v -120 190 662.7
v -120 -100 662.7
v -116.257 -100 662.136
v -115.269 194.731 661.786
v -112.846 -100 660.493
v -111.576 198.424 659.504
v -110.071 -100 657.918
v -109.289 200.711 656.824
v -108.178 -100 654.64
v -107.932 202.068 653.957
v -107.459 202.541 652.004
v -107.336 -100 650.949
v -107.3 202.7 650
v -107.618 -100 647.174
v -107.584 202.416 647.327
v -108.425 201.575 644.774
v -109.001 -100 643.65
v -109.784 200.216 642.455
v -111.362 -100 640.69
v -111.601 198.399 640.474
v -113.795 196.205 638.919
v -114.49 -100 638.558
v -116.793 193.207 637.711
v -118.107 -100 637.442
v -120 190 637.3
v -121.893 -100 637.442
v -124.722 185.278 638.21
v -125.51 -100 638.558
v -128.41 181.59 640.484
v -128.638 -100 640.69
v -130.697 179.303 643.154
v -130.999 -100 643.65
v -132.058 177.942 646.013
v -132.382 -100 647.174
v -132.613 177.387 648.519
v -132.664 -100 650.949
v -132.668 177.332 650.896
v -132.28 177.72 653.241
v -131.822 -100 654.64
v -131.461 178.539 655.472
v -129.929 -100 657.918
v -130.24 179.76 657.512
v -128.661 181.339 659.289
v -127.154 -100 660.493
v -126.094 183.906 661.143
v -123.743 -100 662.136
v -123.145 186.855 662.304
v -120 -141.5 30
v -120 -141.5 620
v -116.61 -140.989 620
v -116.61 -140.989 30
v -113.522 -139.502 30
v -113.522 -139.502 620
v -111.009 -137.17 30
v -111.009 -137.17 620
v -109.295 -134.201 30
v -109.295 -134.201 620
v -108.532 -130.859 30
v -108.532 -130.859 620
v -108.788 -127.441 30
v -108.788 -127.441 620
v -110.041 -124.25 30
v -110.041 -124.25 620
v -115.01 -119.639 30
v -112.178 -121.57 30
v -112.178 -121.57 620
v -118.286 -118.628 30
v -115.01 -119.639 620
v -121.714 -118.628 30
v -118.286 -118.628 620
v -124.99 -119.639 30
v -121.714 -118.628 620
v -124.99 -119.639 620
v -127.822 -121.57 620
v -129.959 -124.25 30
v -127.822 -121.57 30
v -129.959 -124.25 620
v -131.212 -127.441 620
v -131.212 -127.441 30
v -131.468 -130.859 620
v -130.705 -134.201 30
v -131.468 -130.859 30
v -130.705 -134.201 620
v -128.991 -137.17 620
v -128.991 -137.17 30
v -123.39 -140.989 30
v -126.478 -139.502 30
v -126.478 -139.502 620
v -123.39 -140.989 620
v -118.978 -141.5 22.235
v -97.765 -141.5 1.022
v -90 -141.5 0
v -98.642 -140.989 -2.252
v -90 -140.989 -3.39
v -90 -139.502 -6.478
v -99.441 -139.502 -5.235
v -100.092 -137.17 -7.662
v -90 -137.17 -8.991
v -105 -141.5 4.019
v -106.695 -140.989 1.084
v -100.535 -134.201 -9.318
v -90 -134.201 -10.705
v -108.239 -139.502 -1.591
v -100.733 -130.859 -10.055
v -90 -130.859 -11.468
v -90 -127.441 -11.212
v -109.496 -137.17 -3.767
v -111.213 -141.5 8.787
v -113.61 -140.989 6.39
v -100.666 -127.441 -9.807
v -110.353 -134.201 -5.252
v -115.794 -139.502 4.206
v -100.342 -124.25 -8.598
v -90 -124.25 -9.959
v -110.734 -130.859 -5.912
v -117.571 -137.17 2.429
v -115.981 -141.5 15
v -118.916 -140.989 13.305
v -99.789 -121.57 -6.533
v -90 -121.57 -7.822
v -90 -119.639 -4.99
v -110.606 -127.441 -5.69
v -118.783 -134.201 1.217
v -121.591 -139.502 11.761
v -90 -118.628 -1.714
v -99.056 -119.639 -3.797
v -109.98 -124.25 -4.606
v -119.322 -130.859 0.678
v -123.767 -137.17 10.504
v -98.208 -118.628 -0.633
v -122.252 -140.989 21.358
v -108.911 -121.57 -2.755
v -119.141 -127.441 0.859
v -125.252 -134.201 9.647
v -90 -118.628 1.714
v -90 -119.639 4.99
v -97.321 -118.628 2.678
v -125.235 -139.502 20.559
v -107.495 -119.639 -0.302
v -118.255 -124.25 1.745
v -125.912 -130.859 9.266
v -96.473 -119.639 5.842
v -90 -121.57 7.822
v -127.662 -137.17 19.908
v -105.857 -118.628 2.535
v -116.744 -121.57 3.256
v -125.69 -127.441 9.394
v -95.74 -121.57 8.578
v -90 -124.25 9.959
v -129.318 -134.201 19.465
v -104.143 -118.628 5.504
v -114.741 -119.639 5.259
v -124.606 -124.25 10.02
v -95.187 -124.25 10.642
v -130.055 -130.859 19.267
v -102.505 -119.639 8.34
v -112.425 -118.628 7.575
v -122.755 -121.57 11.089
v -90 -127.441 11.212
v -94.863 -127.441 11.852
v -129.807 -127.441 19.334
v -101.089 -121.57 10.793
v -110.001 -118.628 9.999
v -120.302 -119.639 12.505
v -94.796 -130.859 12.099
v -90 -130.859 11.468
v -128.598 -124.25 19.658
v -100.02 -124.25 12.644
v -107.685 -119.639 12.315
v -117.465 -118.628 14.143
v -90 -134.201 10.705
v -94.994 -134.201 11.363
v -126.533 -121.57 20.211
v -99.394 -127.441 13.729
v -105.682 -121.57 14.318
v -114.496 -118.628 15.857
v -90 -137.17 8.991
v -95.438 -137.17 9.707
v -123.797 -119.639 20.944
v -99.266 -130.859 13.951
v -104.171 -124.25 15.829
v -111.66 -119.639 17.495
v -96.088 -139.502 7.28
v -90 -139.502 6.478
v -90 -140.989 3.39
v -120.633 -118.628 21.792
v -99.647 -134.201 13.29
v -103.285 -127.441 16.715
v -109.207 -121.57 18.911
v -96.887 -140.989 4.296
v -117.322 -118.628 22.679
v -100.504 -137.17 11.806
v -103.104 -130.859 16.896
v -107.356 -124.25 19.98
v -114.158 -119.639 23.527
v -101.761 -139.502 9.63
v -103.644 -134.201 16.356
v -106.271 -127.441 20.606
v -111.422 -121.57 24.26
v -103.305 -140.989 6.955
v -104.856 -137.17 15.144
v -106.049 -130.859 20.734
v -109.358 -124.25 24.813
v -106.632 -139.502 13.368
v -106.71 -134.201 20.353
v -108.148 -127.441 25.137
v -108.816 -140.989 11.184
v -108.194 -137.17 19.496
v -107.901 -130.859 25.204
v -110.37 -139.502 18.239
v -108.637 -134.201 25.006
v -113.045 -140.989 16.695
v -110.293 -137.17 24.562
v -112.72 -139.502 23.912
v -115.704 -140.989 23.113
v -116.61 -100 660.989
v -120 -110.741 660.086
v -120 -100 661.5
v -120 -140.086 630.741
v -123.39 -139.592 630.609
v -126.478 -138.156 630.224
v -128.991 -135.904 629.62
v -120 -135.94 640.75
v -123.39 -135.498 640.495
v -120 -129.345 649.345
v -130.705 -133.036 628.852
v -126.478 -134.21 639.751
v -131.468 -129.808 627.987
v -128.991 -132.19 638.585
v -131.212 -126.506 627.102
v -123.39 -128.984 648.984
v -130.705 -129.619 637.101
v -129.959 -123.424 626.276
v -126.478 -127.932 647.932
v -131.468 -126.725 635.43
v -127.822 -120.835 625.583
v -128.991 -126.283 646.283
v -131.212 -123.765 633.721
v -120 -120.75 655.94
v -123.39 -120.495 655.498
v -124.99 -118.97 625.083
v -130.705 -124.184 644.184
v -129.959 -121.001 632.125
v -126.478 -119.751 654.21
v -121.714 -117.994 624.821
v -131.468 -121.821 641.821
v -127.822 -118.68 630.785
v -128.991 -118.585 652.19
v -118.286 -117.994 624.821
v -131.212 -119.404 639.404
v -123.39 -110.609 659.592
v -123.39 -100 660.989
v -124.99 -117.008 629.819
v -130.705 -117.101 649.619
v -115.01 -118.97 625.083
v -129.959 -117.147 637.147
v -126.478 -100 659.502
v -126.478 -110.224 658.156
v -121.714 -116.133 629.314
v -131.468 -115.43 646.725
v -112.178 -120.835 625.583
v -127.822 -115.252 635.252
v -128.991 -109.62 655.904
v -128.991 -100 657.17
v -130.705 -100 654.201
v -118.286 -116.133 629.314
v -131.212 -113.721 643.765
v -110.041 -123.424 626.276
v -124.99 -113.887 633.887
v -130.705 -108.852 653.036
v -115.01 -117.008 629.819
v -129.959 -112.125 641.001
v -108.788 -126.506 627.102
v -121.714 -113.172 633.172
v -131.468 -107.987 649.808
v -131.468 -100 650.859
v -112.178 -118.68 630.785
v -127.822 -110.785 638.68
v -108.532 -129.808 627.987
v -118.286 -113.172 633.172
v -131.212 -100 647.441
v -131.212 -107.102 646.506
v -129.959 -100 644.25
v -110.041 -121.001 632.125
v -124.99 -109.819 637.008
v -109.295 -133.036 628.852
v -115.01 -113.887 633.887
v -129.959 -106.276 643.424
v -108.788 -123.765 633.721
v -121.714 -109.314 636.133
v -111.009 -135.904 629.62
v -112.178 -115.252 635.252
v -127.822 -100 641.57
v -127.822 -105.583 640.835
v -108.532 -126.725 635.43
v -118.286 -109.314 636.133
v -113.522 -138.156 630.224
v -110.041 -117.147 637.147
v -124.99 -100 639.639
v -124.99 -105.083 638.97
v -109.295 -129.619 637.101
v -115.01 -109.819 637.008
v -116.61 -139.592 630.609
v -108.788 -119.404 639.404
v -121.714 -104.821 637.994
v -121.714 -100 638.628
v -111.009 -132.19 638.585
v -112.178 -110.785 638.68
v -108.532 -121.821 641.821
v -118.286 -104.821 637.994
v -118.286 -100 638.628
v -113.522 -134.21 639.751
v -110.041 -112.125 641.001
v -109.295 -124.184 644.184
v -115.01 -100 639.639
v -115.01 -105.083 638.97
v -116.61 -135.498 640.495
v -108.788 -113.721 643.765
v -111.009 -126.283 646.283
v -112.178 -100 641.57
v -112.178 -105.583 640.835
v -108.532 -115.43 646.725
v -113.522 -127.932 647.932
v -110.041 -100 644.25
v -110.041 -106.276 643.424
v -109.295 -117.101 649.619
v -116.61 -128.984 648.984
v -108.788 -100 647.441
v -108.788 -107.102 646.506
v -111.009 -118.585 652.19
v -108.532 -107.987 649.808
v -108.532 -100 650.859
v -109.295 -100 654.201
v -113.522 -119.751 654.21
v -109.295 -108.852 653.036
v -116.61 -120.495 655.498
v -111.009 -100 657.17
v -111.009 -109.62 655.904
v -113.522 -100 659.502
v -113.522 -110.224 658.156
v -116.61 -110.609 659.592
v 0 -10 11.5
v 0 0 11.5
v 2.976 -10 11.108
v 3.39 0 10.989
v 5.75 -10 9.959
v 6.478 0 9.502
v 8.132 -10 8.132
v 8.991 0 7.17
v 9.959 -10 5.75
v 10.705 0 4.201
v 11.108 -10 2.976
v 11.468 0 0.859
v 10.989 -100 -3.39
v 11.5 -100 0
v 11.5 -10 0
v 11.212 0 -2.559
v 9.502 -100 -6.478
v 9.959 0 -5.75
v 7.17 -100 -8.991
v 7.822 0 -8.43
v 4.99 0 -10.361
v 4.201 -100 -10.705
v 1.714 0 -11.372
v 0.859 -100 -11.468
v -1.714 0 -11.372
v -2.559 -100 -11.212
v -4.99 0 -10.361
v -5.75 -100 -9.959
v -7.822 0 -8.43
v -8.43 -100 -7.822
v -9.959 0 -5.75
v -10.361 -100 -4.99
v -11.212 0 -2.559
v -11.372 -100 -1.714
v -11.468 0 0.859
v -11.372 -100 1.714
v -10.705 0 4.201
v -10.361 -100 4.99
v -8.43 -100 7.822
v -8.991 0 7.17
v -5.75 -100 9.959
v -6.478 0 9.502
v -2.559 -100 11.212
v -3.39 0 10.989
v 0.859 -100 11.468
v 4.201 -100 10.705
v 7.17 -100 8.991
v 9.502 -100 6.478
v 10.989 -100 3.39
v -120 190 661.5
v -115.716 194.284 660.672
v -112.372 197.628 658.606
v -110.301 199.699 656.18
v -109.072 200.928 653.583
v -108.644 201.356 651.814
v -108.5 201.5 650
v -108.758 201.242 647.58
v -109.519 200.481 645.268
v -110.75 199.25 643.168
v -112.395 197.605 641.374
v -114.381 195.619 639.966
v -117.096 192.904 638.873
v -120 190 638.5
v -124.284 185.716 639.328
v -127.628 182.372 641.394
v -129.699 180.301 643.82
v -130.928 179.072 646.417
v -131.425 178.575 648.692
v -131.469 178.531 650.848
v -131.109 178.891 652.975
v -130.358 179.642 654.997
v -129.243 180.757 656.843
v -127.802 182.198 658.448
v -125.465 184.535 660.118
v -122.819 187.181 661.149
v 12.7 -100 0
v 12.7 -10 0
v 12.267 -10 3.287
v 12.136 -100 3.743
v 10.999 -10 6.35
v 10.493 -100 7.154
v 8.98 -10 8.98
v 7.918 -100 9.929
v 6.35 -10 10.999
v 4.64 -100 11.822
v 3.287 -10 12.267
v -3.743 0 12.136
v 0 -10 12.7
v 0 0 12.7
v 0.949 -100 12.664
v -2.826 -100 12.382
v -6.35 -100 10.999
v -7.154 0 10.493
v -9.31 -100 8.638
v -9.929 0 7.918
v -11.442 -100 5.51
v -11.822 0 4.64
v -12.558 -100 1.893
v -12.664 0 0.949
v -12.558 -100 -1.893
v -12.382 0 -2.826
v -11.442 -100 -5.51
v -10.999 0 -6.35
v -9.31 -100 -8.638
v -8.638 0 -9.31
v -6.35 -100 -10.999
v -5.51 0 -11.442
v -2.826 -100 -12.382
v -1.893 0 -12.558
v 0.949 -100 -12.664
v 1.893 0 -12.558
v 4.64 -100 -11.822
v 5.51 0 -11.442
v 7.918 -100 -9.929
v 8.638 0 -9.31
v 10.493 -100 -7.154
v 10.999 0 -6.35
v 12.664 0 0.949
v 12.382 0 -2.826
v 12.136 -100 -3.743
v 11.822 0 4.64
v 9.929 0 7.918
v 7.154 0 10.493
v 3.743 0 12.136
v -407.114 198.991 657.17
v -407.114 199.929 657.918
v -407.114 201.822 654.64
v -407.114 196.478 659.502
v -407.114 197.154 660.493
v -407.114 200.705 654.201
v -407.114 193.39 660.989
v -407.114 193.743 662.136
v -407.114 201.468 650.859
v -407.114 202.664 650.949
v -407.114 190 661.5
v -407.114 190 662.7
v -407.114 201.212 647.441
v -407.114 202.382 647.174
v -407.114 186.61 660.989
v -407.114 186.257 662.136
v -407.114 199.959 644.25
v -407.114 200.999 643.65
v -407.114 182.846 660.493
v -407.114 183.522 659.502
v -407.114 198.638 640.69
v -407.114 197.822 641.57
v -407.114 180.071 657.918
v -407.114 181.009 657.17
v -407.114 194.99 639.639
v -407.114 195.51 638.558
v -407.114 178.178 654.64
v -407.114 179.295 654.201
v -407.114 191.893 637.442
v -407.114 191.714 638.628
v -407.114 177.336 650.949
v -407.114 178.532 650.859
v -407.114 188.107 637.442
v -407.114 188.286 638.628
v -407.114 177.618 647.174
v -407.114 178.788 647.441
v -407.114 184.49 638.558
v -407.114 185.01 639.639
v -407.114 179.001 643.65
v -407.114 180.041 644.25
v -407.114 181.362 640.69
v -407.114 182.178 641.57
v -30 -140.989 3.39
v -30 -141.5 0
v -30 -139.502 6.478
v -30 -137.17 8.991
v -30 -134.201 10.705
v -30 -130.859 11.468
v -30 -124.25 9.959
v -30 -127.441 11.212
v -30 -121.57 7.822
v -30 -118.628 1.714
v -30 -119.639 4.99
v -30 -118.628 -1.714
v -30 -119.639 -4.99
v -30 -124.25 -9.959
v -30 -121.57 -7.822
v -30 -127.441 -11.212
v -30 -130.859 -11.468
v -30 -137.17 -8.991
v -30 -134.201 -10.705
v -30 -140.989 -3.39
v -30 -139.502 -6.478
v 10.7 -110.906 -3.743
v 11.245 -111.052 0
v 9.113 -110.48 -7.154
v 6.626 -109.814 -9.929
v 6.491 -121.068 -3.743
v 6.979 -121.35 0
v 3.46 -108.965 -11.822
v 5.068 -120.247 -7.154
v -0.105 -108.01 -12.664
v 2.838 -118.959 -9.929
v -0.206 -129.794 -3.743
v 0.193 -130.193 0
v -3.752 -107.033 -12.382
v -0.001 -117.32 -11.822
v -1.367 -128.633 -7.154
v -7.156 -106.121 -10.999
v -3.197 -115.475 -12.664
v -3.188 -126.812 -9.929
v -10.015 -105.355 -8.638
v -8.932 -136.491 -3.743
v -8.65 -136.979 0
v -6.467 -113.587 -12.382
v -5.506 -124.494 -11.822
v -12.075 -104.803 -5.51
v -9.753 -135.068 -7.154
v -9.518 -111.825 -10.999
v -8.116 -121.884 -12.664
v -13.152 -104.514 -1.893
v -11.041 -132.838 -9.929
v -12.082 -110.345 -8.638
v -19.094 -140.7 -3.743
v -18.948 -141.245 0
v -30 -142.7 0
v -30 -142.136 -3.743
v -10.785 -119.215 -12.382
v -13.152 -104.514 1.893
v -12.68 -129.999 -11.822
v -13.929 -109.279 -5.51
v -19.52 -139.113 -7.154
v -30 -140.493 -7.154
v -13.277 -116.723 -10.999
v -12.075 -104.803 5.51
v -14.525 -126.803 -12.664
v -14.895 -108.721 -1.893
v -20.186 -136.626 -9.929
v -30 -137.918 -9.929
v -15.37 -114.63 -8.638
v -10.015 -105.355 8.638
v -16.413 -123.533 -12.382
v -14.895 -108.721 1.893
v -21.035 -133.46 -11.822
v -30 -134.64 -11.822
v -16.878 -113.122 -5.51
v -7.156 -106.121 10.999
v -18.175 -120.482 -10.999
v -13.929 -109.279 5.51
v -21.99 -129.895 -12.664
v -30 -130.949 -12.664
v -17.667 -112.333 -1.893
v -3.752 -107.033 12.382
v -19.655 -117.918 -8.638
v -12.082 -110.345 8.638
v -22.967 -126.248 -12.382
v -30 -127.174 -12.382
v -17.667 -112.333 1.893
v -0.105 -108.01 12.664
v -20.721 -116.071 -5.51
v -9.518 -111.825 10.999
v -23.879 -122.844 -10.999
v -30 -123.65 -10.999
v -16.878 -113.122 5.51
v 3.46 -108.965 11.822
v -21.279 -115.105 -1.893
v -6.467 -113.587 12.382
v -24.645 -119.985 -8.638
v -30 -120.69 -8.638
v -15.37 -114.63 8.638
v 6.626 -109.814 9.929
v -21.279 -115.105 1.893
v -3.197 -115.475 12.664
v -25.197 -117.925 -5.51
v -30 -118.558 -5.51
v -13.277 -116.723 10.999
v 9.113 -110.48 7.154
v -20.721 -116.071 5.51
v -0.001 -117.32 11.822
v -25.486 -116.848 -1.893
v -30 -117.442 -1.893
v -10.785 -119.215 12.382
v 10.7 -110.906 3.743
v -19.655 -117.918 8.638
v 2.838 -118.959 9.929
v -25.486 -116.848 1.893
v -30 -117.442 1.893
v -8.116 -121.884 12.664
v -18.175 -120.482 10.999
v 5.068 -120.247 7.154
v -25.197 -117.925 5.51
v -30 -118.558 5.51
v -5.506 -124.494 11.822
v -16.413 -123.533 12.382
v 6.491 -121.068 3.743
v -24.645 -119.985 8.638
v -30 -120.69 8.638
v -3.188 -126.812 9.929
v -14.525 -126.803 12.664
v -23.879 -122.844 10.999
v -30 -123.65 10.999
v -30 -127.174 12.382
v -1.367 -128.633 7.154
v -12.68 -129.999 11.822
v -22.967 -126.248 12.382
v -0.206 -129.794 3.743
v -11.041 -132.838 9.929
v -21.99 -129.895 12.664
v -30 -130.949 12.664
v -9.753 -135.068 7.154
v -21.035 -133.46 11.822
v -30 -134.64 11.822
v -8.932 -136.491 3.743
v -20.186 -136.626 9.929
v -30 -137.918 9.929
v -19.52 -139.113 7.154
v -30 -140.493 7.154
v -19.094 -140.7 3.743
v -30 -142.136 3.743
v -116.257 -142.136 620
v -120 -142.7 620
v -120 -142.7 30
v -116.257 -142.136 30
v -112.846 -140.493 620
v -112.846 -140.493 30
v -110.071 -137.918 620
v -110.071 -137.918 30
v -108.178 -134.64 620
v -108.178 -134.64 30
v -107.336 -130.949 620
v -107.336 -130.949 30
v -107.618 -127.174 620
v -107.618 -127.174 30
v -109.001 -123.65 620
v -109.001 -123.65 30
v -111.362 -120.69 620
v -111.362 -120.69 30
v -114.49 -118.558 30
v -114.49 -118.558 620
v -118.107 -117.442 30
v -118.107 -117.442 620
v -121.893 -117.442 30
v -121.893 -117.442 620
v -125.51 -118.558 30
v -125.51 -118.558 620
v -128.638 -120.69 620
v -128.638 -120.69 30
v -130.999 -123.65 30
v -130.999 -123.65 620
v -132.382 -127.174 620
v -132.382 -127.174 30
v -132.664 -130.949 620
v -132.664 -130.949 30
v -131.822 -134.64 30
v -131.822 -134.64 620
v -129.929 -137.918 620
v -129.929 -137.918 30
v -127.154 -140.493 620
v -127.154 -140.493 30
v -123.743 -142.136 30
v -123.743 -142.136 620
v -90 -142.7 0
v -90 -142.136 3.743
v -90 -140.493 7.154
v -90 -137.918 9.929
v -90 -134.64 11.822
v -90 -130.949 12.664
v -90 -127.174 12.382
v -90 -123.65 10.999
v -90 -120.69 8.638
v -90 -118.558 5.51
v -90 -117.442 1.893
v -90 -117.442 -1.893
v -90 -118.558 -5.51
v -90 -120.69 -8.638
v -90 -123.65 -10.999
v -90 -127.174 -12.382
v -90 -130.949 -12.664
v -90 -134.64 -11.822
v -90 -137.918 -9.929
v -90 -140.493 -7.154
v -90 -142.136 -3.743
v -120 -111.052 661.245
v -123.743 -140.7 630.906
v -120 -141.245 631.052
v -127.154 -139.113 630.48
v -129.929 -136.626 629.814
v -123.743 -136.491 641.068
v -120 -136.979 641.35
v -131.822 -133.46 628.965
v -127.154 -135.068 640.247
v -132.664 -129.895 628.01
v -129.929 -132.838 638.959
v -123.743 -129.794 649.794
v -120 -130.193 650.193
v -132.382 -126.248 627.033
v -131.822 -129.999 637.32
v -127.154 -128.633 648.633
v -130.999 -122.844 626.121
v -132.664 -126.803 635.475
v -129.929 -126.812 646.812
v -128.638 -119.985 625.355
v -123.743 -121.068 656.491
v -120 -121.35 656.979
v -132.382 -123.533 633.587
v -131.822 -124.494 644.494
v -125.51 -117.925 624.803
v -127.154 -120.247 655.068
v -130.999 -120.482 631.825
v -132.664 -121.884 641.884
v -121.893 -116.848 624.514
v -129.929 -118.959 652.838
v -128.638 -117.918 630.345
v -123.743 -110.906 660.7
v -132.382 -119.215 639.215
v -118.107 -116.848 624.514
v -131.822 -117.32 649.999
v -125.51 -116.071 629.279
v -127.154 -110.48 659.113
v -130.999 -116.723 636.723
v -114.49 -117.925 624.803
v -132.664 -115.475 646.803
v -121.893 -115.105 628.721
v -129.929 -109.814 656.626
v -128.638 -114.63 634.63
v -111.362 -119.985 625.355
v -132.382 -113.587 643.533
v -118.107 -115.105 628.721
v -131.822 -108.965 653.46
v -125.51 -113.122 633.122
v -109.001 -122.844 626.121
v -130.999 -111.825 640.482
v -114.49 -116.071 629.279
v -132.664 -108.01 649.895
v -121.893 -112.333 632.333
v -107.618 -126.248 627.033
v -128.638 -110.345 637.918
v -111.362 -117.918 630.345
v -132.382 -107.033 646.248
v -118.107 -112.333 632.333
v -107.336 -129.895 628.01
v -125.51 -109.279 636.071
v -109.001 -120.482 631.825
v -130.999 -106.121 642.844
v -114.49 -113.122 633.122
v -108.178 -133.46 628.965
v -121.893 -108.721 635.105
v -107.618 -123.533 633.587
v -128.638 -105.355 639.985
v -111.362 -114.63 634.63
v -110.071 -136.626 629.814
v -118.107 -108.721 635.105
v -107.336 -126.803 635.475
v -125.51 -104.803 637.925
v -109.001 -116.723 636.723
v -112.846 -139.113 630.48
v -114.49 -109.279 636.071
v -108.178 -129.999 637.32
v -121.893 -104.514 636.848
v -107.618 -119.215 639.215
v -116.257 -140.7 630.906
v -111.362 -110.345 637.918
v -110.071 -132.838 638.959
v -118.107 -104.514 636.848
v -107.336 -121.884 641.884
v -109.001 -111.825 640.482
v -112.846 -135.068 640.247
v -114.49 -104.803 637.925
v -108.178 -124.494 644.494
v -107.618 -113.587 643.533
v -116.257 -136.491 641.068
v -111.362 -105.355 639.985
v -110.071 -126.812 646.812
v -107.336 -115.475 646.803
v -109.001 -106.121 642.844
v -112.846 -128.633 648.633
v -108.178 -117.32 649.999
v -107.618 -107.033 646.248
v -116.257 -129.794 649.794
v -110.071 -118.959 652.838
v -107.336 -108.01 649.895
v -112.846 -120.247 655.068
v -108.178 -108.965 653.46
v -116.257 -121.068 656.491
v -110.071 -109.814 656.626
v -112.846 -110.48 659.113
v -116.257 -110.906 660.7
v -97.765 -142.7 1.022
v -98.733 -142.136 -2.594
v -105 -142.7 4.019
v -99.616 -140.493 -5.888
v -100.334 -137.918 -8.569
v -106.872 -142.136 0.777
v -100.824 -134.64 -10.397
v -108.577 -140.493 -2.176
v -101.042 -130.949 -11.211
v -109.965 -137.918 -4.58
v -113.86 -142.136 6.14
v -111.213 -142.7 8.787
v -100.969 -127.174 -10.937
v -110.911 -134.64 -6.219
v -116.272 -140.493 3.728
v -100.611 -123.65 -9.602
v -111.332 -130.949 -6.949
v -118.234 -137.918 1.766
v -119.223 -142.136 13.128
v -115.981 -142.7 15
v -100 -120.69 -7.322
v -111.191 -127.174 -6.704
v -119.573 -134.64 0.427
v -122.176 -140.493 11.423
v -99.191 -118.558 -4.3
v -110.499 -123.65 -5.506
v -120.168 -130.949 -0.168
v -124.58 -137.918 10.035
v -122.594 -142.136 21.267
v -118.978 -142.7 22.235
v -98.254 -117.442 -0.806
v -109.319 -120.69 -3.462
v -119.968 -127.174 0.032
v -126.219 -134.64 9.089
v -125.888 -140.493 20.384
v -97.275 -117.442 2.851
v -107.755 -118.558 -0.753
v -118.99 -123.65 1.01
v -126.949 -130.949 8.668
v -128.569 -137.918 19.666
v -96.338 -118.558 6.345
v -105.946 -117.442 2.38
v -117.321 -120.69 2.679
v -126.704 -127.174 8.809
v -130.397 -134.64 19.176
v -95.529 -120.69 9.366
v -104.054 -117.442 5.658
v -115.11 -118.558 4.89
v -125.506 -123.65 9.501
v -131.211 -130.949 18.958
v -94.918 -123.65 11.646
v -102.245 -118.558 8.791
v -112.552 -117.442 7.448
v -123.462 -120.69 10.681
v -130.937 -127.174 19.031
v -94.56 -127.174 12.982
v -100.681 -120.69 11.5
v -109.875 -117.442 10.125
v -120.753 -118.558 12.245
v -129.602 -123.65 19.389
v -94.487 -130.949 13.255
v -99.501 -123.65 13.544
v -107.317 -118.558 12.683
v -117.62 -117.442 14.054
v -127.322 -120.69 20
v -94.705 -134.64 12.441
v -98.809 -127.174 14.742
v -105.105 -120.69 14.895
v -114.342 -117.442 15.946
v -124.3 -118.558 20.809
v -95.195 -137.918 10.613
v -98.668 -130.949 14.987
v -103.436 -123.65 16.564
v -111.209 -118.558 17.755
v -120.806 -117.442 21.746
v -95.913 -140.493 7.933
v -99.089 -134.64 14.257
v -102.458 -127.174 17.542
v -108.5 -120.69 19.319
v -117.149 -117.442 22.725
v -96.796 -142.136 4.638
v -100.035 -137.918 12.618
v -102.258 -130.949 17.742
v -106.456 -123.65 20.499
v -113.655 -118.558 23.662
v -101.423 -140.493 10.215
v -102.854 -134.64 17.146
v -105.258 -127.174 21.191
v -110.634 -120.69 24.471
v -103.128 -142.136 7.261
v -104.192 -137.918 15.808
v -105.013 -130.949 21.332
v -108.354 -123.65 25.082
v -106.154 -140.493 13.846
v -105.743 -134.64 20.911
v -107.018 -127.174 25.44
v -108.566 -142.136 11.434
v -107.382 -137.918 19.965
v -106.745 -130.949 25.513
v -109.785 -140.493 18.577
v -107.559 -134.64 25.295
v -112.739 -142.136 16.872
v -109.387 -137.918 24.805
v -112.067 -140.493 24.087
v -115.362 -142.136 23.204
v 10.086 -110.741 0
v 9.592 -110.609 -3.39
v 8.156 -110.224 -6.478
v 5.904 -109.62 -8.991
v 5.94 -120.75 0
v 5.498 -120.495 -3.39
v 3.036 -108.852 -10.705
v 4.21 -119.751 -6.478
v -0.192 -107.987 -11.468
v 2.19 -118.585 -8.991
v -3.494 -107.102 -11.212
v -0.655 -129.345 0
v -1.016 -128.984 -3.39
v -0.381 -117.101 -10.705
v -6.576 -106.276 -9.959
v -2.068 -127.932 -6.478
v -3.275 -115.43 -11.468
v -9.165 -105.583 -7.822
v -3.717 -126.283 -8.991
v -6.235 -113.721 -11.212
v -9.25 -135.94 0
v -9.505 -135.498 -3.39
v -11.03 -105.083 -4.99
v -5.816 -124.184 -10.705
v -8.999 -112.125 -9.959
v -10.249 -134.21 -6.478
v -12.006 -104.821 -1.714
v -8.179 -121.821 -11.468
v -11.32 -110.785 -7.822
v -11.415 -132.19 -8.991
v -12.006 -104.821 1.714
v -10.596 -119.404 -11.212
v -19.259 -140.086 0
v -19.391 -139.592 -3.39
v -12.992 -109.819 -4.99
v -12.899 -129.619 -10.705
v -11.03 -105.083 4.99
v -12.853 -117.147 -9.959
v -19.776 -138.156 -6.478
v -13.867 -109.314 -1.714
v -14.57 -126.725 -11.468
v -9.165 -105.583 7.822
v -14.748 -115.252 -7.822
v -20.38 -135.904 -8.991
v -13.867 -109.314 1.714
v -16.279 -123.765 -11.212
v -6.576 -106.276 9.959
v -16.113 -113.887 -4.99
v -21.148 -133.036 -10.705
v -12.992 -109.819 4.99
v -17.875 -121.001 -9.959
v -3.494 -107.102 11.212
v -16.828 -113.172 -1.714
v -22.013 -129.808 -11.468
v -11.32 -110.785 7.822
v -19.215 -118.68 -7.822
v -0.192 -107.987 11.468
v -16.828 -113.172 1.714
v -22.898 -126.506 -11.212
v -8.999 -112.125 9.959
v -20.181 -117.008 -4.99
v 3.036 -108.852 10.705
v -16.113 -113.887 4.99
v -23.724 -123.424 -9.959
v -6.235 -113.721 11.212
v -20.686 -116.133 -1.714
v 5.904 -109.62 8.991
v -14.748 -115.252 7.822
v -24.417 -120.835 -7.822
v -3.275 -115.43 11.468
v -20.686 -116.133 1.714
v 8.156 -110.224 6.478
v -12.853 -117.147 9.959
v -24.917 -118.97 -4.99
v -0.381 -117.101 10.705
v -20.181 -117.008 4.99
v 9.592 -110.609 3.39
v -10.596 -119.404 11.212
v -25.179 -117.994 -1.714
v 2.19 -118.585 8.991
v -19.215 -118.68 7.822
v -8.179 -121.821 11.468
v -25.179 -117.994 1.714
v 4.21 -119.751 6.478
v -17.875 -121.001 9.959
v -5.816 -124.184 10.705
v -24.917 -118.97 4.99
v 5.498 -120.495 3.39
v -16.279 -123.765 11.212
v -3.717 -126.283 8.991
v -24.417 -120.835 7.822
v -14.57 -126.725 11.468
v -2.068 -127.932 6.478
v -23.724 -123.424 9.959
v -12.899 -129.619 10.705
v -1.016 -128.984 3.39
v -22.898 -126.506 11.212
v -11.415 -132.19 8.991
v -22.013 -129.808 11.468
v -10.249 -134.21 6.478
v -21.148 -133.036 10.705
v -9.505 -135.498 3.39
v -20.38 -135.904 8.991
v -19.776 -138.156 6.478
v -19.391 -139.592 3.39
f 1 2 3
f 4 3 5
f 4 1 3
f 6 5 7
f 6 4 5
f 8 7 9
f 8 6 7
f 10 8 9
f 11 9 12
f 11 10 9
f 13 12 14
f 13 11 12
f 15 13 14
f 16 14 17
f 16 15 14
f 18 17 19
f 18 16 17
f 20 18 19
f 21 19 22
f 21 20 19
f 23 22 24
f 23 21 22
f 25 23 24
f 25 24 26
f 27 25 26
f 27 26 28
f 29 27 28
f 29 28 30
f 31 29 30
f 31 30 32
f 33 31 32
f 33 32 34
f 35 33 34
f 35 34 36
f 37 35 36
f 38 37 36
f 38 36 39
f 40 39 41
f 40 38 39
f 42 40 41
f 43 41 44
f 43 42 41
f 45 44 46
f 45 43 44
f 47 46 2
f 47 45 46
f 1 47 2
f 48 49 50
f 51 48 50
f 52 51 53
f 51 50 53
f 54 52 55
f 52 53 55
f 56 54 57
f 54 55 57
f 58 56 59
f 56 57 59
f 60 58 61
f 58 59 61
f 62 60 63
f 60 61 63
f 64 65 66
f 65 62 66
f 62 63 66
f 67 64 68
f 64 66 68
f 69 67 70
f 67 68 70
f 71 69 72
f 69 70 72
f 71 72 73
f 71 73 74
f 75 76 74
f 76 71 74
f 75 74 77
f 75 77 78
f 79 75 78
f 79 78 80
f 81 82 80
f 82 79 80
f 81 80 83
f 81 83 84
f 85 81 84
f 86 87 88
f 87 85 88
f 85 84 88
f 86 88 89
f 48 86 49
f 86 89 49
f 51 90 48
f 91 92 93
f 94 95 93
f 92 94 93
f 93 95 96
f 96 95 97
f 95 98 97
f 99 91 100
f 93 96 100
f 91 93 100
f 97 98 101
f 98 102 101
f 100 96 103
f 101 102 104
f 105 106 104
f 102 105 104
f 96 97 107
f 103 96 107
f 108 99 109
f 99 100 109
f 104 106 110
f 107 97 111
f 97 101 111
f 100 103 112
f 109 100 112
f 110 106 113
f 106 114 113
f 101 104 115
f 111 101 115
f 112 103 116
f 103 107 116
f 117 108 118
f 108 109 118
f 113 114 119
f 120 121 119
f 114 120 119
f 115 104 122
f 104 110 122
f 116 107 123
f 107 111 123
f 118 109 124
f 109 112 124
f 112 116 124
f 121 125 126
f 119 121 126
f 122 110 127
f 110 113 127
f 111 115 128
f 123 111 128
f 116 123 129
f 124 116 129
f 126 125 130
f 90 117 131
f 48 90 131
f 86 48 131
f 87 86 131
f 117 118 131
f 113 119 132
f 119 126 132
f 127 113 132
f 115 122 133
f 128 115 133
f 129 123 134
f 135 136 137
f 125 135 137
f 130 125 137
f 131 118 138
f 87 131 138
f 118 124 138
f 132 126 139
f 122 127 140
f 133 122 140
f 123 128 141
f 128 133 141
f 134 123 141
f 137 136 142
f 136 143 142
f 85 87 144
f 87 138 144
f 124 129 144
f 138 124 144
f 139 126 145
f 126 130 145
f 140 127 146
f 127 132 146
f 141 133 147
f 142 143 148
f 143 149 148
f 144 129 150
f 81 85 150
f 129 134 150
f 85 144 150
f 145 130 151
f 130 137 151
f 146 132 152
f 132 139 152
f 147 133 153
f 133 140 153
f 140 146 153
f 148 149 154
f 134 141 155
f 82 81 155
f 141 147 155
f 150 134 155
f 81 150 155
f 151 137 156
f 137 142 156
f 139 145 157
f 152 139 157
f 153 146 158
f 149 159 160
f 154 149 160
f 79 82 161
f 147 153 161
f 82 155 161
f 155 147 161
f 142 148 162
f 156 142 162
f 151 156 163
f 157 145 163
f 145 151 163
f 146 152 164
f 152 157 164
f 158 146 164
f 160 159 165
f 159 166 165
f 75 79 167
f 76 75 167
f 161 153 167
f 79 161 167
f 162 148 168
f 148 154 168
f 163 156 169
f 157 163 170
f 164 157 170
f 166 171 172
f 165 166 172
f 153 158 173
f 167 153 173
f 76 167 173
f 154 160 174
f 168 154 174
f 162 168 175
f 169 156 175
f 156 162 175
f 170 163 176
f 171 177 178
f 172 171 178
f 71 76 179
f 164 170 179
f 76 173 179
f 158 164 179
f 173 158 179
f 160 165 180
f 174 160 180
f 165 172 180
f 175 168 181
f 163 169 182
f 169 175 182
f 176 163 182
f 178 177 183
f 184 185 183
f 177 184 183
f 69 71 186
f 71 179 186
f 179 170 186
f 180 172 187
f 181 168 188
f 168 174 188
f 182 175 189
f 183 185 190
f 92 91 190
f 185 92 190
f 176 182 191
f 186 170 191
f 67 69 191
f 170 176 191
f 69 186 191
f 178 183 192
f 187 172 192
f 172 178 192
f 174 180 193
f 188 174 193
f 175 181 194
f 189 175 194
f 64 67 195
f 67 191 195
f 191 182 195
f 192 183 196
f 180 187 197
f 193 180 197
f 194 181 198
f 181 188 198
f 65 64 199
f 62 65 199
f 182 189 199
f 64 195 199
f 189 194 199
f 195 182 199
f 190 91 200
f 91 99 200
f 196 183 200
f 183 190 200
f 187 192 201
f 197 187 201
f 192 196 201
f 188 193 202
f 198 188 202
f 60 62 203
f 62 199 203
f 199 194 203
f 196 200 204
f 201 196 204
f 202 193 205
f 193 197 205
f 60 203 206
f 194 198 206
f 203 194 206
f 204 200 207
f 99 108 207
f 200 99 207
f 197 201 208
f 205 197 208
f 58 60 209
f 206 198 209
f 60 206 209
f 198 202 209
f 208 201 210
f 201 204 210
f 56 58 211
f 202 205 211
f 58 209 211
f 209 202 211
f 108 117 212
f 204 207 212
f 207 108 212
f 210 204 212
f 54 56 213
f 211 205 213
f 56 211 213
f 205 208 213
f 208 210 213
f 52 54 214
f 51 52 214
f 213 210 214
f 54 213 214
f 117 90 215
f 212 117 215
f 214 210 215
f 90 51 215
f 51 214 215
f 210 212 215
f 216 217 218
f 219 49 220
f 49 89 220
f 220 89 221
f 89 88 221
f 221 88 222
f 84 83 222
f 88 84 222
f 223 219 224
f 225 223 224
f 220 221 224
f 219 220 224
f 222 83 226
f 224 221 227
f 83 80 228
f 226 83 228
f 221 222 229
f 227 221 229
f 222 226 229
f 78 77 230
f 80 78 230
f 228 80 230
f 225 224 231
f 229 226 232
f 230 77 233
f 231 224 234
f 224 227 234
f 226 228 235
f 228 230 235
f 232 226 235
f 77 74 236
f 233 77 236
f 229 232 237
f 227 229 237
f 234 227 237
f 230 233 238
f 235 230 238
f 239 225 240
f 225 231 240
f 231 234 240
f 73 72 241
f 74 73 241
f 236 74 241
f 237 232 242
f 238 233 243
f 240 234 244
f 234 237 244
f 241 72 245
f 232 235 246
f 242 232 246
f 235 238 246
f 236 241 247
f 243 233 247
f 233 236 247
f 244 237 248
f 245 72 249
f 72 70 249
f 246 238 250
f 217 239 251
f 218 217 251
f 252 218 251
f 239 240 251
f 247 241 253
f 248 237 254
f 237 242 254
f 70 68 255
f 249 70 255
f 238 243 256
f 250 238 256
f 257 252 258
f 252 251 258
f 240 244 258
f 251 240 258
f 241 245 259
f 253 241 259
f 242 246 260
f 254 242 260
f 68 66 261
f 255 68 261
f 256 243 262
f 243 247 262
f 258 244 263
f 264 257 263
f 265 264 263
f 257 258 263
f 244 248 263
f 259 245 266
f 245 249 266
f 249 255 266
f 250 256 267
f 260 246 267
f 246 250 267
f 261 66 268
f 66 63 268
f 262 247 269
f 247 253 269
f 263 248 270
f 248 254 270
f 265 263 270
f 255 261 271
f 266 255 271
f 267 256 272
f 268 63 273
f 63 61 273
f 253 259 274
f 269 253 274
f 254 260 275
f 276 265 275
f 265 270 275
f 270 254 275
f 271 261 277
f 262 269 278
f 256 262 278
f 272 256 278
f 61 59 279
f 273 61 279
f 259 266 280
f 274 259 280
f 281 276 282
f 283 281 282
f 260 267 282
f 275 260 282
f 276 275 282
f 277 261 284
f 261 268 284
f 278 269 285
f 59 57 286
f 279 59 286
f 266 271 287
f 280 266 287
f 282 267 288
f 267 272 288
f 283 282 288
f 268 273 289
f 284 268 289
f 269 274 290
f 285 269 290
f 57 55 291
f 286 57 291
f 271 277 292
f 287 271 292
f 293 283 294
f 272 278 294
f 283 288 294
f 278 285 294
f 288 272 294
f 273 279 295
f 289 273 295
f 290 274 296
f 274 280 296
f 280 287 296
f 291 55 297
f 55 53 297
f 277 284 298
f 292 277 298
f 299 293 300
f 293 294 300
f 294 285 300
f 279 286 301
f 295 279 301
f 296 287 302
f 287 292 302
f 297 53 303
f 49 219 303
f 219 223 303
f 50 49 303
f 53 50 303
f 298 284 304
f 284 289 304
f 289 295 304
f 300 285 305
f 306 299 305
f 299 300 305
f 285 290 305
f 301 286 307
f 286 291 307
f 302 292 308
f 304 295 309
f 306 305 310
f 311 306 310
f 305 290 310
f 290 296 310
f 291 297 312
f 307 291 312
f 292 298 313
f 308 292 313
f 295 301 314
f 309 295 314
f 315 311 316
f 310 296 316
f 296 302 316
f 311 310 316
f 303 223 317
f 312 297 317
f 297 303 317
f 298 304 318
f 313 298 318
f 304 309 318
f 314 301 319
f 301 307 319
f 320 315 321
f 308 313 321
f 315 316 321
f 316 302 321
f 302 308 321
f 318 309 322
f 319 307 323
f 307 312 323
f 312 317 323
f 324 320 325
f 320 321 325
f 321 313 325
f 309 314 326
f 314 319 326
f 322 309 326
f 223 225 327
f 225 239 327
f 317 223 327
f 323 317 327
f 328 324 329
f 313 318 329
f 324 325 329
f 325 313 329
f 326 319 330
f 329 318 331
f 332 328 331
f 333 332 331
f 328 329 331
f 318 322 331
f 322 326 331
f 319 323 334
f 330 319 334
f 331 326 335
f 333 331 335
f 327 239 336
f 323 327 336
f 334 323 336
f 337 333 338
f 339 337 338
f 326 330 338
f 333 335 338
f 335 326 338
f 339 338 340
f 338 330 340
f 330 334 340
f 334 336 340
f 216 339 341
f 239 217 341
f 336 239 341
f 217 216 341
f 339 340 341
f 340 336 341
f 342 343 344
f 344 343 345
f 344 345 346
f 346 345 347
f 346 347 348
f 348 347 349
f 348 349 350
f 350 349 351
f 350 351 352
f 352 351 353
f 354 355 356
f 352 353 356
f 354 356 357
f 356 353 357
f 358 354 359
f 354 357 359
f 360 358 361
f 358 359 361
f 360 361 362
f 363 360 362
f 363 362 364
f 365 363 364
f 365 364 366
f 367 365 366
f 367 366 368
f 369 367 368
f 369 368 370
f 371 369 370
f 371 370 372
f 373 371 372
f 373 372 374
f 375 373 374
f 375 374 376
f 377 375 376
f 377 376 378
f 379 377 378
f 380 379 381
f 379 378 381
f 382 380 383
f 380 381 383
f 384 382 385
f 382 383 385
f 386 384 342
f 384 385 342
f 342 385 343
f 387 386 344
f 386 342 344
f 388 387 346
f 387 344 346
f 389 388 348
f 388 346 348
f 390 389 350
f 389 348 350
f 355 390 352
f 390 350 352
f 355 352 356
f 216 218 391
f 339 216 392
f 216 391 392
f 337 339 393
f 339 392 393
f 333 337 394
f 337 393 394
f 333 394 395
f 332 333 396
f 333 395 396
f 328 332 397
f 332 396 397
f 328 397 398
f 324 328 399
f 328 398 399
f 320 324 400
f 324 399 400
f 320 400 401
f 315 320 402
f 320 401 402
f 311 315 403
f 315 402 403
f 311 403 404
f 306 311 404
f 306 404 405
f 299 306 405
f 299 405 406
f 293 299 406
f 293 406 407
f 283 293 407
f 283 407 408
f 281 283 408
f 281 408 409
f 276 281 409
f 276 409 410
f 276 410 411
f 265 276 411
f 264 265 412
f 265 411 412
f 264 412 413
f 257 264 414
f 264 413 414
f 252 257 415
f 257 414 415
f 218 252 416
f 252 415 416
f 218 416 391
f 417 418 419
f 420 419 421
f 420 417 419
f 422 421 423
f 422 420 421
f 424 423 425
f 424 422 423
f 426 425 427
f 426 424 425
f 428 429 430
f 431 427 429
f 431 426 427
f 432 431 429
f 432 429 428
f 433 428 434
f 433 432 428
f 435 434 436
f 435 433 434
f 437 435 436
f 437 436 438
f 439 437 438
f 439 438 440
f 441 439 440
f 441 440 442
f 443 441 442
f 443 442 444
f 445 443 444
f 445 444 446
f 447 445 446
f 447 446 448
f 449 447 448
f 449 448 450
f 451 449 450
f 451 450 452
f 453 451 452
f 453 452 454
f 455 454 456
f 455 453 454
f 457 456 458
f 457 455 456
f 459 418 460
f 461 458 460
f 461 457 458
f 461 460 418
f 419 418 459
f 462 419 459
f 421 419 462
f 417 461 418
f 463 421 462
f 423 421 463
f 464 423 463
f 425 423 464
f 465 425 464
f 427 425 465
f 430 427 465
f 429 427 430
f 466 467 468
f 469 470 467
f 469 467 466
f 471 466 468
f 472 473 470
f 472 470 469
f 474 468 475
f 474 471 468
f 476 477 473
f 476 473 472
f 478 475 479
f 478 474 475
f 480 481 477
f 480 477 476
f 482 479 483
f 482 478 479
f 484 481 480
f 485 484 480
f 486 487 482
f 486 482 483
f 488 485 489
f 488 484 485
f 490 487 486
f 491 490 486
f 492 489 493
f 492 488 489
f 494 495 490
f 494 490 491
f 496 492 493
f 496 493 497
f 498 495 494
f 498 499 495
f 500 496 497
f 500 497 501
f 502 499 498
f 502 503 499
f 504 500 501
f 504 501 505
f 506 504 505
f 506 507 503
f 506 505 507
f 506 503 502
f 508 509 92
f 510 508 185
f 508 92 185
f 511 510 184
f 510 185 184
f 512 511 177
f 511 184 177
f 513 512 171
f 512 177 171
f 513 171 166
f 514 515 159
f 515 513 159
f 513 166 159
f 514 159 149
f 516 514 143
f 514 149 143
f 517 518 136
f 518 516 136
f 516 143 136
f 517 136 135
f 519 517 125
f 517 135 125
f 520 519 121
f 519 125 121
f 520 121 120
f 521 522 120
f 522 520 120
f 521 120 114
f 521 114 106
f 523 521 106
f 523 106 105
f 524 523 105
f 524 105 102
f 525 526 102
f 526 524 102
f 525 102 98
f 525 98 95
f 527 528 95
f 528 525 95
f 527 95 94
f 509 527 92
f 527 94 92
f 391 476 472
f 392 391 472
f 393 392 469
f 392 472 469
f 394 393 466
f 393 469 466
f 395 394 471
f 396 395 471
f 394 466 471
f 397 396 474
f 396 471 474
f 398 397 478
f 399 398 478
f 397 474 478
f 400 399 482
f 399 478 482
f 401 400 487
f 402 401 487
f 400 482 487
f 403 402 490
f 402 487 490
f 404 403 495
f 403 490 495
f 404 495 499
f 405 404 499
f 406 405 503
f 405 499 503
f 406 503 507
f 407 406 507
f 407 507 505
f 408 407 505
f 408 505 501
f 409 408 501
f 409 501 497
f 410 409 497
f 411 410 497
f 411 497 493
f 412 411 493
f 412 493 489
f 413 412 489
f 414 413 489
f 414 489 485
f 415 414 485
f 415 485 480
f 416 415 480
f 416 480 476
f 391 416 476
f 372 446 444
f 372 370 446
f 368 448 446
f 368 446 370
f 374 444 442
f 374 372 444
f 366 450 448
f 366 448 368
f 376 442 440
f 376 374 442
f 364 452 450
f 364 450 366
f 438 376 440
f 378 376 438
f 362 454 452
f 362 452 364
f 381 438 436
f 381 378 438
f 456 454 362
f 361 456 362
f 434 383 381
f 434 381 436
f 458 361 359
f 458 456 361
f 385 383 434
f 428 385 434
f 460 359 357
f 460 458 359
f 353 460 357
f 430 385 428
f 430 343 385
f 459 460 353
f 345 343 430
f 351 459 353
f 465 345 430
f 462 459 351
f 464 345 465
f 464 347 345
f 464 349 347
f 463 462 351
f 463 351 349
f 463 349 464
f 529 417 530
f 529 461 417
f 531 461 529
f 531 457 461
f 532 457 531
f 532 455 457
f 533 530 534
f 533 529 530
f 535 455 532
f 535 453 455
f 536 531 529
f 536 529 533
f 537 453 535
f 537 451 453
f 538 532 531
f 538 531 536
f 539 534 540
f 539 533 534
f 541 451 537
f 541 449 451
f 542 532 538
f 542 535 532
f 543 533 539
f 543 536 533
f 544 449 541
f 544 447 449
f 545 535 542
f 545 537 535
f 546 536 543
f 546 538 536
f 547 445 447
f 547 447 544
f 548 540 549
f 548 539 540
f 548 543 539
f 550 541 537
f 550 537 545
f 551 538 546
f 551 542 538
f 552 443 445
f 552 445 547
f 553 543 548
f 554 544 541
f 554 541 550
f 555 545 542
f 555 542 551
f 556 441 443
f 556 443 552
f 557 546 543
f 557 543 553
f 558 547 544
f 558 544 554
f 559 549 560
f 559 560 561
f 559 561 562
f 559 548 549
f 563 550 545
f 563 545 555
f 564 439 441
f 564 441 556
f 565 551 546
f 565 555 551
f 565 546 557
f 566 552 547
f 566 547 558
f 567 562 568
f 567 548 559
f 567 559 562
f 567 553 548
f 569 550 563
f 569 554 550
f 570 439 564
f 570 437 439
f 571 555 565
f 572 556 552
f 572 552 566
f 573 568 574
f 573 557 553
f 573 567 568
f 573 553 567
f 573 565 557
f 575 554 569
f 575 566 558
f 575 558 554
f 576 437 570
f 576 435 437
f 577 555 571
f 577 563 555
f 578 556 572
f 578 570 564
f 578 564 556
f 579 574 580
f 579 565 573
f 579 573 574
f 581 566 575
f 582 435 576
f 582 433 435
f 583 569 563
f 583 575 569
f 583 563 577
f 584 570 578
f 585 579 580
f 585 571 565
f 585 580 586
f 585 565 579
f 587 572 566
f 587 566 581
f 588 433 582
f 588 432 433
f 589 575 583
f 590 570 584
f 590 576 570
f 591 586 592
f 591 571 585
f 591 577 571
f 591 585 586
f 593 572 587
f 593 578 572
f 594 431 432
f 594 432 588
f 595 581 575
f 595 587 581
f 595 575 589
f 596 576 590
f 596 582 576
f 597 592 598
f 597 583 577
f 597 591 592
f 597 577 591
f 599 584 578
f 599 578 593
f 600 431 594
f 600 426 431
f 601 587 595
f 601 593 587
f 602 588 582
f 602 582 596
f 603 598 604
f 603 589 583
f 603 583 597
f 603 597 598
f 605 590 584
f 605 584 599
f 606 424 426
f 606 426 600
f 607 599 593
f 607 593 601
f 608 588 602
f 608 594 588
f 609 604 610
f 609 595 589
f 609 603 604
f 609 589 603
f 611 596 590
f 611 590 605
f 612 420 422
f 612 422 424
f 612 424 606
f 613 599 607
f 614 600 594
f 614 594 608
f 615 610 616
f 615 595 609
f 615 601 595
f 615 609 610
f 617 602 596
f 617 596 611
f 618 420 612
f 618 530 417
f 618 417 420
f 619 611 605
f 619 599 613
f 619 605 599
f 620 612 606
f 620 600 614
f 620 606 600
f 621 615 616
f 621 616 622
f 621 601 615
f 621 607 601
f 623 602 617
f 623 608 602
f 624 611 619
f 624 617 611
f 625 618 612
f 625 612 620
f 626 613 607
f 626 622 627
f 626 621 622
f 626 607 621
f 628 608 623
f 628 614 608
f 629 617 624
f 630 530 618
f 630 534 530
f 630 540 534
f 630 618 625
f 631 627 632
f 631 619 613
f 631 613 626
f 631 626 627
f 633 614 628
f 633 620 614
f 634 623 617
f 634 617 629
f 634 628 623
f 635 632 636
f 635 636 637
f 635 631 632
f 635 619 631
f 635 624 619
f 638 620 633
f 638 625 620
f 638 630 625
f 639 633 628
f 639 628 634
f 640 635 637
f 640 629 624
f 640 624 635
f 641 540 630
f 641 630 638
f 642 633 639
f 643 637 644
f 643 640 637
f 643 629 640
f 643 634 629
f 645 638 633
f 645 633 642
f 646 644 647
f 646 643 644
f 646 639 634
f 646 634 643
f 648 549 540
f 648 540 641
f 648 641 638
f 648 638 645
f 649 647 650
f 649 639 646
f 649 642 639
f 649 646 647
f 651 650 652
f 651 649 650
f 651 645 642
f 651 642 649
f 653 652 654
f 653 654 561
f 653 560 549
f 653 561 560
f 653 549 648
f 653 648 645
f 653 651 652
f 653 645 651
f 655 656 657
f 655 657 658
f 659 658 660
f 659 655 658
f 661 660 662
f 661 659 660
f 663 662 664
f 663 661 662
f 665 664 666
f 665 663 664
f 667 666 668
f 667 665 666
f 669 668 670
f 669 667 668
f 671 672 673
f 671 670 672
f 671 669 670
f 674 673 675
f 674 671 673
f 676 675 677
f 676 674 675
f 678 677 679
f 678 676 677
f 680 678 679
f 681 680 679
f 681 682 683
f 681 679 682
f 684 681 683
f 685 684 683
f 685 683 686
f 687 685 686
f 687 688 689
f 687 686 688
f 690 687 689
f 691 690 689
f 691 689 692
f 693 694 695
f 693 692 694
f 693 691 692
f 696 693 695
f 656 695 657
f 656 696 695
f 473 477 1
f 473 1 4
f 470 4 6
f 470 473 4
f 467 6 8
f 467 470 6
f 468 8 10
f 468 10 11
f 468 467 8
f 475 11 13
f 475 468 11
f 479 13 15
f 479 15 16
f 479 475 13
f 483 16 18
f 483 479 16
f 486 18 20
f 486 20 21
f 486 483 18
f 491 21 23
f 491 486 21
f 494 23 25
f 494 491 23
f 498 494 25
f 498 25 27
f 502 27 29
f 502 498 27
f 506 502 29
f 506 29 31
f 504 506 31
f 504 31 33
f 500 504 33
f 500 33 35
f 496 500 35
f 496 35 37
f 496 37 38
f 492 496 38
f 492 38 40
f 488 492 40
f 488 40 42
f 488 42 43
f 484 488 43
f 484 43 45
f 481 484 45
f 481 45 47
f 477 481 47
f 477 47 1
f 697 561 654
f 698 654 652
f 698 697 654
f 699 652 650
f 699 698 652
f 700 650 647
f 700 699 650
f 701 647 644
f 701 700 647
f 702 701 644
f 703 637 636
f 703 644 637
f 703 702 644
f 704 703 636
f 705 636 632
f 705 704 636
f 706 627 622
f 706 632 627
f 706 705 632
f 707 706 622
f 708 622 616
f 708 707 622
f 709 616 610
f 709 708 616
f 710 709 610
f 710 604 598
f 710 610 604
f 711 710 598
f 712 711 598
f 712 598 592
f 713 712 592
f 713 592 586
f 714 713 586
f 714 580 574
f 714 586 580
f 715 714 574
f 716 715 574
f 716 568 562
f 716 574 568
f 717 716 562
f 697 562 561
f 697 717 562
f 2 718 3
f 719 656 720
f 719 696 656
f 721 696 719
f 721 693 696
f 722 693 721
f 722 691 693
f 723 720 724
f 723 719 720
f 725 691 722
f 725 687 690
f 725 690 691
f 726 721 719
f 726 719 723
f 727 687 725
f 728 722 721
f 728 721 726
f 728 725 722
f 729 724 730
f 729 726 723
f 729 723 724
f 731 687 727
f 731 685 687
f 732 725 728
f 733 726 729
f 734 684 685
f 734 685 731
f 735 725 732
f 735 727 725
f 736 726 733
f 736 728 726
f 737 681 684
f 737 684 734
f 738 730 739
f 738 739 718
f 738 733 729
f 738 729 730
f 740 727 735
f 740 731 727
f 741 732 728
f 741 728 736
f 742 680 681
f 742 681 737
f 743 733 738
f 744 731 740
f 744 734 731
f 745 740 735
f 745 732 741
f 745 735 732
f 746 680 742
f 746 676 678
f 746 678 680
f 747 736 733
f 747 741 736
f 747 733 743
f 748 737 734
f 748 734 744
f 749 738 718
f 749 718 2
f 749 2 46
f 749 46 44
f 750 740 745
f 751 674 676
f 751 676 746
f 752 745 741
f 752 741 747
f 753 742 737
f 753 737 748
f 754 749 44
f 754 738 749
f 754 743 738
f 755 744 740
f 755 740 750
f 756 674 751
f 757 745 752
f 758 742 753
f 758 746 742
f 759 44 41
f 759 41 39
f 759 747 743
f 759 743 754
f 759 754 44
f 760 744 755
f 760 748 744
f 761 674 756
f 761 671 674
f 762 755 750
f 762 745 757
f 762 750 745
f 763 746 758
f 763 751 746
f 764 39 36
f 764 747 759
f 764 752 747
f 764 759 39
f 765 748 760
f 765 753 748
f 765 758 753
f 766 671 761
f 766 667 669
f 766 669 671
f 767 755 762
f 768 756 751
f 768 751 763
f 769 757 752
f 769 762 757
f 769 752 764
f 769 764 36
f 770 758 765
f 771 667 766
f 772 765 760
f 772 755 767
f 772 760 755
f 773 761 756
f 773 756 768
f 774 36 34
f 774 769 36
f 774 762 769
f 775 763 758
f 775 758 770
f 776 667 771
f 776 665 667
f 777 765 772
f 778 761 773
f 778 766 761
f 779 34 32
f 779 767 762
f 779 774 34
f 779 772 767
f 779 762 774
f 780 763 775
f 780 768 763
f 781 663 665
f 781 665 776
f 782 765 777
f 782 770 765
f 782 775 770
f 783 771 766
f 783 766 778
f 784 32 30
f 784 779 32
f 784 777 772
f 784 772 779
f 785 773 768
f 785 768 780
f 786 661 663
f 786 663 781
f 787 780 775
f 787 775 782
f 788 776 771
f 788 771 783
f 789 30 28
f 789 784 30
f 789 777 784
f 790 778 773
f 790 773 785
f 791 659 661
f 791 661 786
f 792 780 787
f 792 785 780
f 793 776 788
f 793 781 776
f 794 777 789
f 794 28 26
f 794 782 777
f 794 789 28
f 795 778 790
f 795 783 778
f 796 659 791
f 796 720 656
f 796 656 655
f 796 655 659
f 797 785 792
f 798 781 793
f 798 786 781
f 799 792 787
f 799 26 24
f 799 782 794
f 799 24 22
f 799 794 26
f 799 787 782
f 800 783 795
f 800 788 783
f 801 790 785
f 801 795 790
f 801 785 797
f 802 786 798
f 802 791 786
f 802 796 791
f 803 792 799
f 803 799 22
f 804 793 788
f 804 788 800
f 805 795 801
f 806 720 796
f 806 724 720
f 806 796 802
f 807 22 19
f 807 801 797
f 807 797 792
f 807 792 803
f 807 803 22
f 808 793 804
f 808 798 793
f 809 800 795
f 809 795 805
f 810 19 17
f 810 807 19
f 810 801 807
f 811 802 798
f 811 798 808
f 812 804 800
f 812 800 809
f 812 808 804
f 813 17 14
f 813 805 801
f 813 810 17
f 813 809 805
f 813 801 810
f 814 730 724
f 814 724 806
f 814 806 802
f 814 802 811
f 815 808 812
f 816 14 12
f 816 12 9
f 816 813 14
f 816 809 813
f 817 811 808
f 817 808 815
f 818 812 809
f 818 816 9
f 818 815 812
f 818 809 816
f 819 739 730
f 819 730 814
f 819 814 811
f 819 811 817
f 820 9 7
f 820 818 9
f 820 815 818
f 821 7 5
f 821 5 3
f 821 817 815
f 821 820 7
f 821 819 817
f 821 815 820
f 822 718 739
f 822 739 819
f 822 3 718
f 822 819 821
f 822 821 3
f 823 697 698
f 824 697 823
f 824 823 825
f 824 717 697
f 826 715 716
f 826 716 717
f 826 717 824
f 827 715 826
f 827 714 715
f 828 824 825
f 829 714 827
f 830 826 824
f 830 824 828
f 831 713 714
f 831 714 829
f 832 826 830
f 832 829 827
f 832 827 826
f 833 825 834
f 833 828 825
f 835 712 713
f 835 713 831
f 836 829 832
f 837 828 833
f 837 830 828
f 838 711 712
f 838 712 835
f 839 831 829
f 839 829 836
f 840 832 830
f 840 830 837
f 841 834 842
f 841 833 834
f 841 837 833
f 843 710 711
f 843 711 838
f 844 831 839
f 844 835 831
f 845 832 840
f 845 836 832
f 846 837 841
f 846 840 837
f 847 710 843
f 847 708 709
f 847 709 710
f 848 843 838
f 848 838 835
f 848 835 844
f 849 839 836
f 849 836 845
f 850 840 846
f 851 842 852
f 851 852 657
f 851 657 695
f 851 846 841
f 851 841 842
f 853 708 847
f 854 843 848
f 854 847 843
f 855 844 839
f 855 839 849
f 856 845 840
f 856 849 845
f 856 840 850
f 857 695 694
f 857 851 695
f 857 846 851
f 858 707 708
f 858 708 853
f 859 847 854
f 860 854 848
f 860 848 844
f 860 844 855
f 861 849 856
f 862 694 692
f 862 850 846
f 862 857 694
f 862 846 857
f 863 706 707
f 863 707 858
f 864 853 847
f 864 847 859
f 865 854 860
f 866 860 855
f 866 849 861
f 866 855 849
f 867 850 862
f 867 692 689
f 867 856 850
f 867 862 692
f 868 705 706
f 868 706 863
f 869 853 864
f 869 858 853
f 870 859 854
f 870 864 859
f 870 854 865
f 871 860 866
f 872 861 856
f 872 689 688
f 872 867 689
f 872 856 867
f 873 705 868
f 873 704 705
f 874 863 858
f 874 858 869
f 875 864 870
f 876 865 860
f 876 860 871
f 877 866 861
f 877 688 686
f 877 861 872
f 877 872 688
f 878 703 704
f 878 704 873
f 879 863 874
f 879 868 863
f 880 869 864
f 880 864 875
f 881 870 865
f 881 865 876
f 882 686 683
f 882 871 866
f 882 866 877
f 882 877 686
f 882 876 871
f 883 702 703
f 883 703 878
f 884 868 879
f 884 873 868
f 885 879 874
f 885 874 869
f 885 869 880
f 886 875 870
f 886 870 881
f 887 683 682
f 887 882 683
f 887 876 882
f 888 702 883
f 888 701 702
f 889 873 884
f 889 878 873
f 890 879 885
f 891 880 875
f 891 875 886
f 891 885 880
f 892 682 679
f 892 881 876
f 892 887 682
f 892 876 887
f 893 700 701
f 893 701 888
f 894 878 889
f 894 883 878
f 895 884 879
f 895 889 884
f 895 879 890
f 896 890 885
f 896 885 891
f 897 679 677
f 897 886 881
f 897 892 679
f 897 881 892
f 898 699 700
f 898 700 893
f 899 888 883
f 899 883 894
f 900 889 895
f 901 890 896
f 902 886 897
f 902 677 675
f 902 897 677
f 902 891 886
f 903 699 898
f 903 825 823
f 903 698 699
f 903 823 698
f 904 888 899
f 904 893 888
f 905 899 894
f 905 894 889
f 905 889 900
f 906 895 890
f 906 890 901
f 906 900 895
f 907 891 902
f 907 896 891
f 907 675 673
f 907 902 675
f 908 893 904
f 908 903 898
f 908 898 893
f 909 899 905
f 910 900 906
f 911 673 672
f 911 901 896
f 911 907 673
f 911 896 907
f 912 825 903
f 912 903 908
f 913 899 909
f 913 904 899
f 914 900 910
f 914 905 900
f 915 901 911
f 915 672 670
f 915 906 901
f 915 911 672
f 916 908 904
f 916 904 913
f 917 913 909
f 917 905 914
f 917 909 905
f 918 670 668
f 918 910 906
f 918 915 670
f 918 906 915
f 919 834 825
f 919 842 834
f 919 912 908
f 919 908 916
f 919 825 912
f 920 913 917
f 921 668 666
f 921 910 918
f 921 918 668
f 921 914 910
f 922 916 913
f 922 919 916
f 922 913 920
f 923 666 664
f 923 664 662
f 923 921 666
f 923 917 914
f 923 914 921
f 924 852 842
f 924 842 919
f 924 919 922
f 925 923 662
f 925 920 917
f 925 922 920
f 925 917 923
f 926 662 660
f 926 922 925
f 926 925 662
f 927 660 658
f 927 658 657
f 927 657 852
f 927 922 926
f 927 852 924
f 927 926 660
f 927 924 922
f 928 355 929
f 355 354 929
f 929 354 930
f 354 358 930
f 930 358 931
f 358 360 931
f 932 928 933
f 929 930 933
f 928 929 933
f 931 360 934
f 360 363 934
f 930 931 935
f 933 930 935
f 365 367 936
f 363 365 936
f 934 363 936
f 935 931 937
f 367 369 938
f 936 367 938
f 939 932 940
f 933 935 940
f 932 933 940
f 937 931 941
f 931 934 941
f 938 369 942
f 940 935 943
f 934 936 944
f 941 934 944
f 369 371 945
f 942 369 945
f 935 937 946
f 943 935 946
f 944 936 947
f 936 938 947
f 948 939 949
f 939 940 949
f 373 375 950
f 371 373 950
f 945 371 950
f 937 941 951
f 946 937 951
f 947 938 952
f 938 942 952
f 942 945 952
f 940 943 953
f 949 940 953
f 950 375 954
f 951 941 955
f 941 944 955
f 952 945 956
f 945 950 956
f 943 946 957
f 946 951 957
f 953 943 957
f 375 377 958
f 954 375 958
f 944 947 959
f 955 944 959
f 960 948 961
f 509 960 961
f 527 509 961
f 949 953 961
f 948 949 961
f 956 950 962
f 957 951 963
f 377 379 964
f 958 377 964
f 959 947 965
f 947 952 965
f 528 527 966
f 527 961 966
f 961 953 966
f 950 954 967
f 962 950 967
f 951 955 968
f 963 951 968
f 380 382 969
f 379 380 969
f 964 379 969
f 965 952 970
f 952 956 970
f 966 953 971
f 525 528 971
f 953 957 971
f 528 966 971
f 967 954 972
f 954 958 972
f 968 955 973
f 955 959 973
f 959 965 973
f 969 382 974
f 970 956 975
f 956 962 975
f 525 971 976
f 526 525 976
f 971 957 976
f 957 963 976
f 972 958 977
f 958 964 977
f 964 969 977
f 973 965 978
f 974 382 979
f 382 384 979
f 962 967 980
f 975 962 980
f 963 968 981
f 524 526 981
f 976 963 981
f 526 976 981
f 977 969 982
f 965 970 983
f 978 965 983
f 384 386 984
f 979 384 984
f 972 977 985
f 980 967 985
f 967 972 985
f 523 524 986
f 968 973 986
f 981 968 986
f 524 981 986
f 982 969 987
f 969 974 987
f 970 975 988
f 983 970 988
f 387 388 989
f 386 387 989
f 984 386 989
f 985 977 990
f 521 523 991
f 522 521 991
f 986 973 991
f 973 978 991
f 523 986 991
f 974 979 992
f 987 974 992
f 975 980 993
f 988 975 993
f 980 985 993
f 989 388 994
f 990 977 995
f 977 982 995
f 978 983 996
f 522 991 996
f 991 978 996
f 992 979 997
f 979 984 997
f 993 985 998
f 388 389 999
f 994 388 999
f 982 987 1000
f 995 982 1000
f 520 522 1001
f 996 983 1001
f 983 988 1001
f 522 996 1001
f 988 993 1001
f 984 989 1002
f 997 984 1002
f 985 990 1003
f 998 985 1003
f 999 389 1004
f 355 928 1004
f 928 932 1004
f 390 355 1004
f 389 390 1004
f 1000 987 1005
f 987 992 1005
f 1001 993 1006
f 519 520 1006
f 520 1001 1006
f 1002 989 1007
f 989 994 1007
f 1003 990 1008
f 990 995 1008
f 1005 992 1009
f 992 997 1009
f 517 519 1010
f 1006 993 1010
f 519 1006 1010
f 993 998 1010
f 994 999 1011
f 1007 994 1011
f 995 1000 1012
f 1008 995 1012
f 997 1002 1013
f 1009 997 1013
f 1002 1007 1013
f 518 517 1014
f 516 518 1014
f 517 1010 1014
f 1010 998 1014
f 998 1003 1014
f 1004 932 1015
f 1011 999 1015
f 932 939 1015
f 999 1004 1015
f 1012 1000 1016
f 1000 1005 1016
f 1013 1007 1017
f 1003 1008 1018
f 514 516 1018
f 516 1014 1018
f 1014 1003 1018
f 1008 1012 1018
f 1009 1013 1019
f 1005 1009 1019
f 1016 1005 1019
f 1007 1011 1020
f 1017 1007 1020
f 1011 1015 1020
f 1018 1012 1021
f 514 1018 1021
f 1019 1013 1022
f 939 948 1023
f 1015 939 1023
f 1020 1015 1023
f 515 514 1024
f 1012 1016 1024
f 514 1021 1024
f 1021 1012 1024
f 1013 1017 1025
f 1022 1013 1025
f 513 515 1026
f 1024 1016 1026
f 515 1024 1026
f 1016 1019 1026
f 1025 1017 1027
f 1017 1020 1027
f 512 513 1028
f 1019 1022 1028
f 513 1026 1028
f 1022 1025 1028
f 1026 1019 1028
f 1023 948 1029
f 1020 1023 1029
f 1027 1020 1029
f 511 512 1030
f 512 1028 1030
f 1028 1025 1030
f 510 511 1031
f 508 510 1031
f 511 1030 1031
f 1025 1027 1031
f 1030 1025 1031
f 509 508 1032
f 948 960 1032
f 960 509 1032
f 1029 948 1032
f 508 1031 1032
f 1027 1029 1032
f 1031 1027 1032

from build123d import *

# Parameters (mm, degrees)
CROQUIS1_R              = 12.7
CROQUIS1_R_2            = 11.5
SALIENTE_EXTRUIR1_DEPTH = 10
CROQUIS2_R              = 12.7
CROQUIS2_R_2            = 11.5


with BuildPart() as part:
    # Croquis1 → Saliente-Extruir1 (new body)
    with BuildSketch(Plane(origin=(0, 0, 0), x_dir=(1, 0, 0), z_dir=(0, 1, 0))):
        with Locations(Location((0, 0, 0), (0, 0, 270))):
            Circle(CROQUIS1_R)
        with Locations(Location((0, 0, 0), (0, 0, 270))):
            Circle(CROQUIS1_R_2, mode=Mode.SUBTRACT)
    extrude(amount=-SALIENTE_EXTRUIR1_DEPTH)

    # Barrer1: sweep along a curve in space
    with BuildLine() as barrer1_path:
        Line((0, -10, 0), (0, -100, 0))
        ThreePointArc((0, -100, 0), (-8.786796564, -121.213203436, 0), (-30, -130, 0))
        Line((-30, -130, 0), (-90, -130, 0))
        ThreePointArc((-90, -130, 0), (-111.213203436, -130, 8.786796564), (-120, -130, 30))
        Line((-120, -130, 30), (-120, -130, 620))
        ThreePointArc((-120, -130, 620), (-120, -121.213203436, 641.213203436), (-120, -100, 650))
        Line((-120, -100, 650), (-120, 190, 650))
        Line((-120, 190, 650), (-407.11382464, 190, 650))
    # Croquis2 → Barrer1 (sweep)
    with BuildSketch(Plane.XZ.offset(10)):
        Circle(CROQUIS2_R)
        Circle(CROQUIS2_R_2, mode=Mode.SUBTRACT)
    sweep(path=barrer1_path.line, transition=Transition.RIGHT)


solid = part.part
